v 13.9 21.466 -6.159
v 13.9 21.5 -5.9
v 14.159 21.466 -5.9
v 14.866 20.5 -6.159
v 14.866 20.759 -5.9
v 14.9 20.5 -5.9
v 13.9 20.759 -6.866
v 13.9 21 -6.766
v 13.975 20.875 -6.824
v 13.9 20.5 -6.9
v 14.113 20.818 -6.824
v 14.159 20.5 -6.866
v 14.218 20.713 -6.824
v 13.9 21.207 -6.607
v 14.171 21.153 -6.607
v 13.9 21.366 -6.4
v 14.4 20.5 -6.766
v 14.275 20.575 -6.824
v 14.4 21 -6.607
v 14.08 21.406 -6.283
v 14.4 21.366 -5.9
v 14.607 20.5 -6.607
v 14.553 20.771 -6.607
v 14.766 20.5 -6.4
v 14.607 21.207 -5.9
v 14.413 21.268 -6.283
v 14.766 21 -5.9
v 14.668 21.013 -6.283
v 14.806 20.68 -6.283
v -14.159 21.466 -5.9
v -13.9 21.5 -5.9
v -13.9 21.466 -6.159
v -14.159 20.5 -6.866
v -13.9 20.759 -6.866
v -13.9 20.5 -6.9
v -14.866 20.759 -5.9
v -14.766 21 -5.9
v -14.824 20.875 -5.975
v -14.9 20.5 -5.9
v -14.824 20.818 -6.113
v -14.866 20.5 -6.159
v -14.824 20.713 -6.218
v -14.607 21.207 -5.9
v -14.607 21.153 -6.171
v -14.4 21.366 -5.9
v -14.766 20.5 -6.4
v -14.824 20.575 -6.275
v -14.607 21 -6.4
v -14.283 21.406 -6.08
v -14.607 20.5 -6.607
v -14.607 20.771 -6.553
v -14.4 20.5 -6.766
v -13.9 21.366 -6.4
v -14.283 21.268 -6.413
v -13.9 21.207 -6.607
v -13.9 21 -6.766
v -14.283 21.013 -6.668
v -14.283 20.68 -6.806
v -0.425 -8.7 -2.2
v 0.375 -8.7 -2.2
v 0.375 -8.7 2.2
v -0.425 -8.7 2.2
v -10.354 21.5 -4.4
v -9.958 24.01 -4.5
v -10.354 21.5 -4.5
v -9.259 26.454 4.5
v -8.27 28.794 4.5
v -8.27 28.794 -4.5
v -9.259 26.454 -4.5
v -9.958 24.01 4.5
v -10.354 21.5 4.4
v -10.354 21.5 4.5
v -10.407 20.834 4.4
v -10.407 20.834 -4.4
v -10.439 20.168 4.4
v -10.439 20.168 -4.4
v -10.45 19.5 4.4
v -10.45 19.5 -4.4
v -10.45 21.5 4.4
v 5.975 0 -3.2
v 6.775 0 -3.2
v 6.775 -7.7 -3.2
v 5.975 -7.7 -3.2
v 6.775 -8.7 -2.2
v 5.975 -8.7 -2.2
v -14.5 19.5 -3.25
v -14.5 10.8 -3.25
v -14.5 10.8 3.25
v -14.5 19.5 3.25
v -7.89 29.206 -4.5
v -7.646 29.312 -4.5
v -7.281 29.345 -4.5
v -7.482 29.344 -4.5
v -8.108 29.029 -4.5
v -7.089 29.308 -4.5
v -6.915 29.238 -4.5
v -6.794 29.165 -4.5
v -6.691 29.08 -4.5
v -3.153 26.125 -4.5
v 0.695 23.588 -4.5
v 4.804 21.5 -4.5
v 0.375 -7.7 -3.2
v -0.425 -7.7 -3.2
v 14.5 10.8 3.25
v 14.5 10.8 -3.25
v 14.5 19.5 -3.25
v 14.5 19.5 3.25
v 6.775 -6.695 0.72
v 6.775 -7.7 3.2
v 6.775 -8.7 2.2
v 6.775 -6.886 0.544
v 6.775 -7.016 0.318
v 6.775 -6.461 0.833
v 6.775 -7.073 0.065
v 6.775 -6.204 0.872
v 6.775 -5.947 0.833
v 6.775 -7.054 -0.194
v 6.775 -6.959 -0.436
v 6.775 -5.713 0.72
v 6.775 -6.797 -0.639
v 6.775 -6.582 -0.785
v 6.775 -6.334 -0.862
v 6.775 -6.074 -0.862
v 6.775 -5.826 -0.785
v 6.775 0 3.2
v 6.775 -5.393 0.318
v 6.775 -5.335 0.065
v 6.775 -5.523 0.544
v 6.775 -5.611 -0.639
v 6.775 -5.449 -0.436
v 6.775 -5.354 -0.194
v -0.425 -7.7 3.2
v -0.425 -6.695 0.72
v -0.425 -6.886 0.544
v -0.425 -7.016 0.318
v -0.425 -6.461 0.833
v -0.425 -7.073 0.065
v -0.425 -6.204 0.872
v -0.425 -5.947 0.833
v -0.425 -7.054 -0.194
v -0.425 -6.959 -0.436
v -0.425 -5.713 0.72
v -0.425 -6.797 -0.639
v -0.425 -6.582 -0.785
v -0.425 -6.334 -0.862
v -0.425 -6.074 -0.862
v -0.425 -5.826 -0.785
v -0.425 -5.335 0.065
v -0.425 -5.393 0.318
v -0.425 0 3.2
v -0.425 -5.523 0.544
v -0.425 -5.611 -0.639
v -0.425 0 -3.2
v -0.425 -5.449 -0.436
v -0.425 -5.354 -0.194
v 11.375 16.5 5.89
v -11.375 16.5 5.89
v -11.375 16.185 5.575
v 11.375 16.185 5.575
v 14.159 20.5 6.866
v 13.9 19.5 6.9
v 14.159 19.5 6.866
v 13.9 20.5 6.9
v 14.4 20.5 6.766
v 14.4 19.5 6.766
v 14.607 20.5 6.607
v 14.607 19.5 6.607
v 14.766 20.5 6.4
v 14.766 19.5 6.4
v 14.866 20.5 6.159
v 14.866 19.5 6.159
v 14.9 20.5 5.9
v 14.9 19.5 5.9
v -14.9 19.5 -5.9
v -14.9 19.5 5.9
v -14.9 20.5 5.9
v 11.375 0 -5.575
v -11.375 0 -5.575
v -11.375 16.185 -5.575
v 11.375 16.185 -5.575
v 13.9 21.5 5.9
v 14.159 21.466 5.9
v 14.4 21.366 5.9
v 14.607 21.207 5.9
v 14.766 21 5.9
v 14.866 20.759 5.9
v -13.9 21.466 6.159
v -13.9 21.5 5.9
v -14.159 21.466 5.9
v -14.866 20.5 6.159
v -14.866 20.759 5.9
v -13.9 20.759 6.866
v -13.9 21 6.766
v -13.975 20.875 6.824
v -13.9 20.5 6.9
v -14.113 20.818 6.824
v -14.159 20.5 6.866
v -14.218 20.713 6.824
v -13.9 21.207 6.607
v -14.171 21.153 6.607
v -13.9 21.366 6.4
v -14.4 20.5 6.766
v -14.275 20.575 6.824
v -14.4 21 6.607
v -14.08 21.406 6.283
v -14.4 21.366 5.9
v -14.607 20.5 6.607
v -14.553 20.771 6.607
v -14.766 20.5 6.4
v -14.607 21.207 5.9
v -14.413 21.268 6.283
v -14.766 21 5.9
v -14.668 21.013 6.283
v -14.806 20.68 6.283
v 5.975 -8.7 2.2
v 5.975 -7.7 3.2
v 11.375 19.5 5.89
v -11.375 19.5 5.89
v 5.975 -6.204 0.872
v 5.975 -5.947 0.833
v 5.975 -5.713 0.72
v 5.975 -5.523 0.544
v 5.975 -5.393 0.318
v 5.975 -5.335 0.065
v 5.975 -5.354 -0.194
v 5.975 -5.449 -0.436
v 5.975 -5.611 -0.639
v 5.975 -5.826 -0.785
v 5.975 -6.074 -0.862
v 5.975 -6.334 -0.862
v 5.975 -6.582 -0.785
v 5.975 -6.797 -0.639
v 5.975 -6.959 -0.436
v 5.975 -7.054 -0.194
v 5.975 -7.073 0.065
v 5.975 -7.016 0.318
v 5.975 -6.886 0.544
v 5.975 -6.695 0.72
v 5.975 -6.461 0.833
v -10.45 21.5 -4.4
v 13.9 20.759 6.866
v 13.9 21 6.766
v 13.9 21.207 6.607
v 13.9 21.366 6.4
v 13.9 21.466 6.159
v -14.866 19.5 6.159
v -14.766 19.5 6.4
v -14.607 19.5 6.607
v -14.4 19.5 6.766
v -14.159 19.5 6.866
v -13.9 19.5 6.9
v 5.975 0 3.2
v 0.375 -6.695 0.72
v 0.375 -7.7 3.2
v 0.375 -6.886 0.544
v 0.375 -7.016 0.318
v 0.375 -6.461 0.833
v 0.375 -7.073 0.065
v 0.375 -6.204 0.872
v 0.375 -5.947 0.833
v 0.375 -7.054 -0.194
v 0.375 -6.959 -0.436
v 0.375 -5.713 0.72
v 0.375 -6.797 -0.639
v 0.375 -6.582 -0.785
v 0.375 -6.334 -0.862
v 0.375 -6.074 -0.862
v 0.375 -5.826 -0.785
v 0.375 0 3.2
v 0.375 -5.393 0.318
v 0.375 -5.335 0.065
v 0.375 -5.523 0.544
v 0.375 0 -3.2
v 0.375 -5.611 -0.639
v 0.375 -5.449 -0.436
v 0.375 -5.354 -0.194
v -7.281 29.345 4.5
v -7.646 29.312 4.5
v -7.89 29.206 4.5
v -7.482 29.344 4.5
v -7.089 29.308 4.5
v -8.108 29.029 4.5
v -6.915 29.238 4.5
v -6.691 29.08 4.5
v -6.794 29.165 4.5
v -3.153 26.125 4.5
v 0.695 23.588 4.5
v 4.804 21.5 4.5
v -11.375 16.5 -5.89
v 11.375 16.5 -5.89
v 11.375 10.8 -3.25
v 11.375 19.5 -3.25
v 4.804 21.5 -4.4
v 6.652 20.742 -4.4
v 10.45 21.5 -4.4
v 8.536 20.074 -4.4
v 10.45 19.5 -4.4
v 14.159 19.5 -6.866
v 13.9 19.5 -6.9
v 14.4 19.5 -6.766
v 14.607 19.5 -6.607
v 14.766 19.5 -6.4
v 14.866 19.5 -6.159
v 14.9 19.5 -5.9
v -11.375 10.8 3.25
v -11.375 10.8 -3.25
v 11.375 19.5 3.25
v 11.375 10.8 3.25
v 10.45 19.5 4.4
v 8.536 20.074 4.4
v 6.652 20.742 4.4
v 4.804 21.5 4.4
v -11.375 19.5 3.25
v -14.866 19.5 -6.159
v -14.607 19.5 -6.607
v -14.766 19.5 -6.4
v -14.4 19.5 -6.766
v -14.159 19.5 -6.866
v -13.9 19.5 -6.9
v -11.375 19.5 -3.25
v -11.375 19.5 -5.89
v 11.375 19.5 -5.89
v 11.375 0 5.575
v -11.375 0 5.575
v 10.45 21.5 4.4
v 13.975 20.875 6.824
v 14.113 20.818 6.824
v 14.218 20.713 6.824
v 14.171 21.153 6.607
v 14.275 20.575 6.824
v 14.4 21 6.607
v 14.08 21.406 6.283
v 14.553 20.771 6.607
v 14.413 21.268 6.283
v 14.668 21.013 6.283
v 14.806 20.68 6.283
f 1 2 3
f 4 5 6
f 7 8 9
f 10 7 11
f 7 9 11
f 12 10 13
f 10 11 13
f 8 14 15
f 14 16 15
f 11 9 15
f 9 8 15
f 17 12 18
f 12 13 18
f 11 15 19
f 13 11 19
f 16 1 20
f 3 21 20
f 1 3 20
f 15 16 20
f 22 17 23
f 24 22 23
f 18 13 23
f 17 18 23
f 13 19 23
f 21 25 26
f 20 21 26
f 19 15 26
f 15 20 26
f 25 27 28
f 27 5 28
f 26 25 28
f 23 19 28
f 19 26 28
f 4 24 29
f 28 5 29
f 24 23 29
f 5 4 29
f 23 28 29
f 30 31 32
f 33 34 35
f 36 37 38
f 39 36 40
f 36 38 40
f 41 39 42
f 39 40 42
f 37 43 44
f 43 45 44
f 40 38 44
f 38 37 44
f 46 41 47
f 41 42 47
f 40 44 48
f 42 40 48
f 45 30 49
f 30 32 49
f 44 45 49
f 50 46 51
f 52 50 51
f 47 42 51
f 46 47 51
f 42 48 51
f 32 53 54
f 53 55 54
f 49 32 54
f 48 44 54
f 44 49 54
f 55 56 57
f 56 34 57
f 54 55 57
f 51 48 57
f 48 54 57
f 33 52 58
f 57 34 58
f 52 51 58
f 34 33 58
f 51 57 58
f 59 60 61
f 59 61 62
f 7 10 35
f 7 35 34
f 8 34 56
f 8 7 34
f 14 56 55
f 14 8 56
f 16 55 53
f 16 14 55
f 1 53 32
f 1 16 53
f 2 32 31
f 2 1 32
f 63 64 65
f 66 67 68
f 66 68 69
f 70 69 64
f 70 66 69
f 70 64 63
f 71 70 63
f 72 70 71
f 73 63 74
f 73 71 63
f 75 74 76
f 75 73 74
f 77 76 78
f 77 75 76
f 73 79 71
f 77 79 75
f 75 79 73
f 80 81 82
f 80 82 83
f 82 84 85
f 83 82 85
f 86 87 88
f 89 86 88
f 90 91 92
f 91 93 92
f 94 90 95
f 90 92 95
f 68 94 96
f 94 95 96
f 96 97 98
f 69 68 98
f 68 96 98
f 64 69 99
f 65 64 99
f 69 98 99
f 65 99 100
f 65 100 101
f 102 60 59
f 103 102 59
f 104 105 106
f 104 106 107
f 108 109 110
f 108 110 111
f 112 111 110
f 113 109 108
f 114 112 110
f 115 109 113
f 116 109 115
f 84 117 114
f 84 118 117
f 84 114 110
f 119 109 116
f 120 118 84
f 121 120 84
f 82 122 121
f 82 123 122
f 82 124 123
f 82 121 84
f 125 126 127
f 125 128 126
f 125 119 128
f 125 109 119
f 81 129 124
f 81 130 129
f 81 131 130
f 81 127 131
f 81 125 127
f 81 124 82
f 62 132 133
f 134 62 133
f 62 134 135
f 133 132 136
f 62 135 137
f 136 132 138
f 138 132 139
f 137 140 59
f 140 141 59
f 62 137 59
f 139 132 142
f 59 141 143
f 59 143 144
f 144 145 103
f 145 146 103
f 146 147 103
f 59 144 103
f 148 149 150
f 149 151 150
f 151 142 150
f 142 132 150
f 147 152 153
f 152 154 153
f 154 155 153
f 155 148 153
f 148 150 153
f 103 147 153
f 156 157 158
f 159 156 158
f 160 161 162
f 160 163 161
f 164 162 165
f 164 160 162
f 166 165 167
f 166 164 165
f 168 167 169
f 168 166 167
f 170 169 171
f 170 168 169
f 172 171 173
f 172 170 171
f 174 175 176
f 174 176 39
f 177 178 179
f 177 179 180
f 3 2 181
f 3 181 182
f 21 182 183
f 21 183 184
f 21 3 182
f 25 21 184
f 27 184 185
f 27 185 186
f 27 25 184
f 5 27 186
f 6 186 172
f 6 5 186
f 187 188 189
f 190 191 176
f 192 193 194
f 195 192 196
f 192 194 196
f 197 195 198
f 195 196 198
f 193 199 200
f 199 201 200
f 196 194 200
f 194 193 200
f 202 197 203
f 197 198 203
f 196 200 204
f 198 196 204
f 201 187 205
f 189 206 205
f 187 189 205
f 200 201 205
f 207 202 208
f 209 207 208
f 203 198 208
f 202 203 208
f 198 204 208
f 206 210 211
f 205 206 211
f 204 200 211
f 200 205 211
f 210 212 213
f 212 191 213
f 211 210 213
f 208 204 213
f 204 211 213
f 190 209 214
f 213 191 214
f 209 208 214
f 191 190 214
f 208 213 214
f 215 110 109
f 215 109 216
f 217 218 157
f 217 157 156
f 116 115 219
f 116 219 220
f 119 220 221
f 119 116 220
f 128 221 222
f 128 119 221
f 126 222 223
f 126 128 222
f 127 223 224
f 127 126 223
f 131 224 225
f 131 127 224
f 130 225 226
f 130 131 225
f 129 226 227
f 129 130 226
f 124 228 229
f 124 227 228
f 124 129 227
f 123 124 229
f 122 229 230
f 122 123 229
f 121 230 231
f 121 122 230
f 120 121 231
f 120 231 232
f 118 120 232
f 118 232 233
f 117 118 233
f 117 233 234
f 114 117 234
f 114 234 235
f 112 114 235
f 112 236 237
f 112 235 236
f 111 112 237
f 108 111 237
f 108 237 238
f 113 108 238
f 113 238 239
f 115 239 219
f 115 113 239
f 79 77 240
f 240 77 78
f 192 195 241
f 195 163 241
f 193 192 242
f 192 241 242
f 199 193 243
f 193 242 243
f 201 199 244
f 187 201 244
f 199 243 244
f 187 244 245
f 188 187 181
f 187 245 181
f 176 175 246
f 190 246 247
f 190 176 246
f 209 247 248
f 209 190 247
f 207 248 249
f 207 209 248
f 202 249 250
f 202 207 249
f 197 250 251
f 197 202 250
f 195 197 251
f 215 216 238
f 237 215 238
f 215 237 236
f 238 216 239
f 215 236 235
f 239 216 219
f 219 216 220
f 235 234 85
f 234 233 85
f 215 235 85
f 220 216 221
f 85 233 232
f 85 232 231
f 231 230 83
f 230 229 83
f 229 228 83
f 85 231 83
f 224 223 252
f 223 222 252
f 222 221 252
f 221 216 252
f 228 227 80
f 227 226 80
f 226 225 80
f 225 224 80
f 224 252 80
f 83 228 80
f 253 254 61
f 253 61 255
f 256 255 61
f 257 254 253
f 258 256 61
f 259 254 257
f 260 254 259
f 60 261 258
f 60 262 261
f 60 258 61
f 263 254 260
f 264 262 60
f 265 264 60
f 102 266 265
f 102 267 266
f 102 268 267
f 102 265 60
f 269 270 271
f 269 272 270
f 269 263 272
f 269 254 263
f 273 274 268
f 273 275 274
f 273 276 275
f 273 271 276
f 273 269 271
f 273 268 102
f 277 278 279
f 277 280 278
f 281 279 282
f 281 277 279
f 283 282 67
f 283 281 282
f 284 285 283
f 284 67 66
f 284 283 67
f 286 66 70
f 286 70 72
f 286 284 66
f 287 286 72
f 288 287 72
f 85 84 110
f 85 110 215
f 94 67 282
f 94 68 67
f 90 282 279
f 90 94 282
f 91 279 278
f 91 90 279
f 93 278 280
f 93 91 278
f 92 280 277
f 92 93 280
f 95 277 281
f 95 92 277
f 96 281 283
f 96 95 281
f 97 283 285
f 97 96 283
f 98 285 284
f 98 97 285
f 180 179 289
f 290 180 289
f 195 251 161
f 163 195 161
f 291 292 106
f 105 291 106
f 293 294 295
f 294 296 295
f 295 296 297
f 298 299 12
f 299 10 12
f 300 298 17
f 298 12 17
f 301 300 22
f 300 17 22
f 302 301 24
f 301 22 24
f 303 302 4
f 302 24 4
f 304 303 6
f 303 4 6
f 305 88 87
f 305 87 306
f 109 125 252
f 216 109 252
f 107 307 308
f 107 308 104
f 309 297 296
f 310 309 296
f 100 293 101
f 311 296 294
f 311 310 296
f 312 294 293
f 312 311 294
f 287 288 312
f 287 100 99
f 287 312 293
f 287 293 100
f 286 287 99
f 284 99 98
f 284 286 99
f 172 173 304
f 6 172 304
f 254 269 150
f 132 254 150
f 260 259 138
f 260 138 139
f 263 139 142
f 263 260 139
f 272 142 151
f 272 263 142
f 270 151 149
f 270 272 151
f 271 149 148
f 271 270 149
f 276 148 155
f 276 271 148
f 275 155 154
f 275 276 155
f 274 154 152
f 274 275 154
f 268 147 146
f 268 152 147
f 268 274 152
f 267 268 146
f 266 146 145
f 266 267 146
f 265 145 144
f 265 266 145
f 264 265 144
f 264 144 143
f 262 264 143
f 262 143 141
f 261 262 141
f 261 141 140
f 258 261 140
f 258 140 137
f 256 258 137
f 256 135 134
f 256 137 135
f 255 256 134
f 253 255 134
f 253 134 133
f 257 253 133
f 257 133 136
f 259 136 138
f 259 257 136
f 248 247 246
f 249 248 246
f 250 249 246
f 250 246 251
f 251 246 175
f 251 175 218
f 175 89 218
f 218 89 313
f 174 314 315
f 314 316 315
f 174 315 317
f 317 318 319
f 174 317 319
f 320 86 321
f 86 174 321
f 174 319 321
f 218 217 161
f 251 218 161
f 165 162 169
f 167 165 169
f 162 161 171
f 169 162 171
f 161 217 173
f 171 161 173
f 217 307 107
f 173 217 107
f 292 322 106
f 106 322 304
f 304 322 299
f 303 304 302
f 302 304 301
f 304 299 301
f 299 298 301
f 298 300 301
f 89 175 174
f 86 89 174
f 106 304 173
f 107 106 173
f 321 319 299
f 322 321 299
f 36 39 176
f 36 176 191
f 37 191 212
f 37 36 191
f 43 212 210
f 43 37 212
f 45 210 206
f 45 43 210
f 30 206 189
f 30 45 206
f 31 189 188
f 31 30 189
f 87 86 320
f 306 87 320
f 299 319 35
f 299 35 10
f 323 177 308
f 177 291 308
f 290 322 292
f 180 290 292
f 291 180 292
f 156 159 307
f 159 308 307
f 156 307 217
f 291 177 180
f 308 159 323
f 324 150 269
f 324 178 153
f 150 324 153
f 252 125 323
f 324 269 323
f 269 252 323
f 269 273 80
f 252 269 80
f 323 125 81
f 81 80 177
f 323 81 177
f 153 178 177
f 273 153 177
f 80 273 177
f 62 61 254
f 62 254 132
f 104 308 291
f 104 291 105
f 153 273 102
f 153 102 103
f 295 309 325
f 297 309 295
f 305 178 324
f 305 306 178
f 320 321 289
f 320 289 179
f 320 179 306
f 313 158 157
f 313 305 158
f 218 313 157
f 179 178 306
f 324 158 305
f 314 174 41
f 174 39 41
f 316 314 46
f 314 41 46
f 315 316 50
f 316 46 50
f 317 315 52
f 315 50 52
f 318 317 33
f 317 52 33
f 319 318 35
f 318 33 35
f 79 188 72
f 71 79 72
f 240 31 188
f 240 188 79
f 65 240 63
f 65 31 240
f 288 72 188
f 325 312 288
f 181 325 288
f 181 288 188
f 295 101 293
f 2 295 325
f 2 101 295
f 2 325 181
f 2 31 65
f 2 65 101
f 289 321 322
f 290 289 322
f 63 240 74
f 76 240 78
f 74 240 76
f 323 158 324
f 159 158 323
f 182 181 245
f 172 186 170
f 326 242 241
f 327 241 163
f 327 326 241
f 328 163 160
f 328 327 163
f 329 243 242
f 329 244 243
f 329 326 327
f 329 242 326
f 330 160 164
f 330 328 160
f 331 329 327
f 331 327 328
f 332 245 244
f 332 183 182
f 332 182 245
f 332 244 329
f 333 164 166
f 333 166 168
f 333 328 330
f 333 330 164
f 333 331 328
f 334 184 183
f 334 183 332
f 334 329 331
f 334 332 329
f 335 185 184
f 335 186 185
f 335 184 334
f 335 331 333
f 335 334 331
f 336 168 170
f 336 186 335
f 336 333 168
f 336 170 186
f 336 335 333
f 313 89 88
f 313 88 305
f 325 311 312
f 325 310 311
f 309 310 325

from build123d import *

# Parameters (mm, degrees)
SKETCH1_W               = 22.75
SKETCH1_H               = 11.15
BOSS_EXTRUDE1_DEPTH     = 19.5
SKETCH2_W               = 29.8
SKETCH2_H               = 13.8
SKETCH2_W_2             = 20.9
SKETCH2_H_2             = 8.8
BOSS_EXTRUDE2_DEPTH     = 2
FILLET1_R               = 1
BOSS_EXTRUDE3_DEPTH     = 4.5
FILLET2_R               = 1
SKETCH4_W               = 0.8
SKETCH4_H               = 6.4
BOSS_EXTRUDE4_DEPTH     = 8.7
CHAMFER1_SIZE           = 1
SKETCH5_W               = 29
SKETCH5_H               = 6.5
BOSS_EXTRUDE5_DEPTH     = 8.7
SKETCH6_W               = 22.75
SKETCH6_H               = 11.78
BOSS_EXTRUDE6_DEPTH     = 3.5
CHAMFER2_SIZE           = 0.5
CUT_EXTRUDE1_DEPTH      = 34.821116013
CUT_EXTRUDE1_DEPTH_BACK = 34.821116013
SKETCH7_R               = 0.871711707


with BuildPart() as part:
    # Sketch1 → Boss-Extrude1 (new body)
    with BuildSketch(Plane(origin=(0, 0, 0), x_dir=(1, 0, 0), z_dir=(0, 1, 0))):
        Rectangle(SKETCH1_W, SKETCH1_H)
    extrude(amount=BOSS_EXTRUDE1_DEPTH)

    # Sketch2 → Boss-Extrude2 (add)
    with BuildSketch(Plane(origin=(0, 19.5, 0), x_dir=(1, 0, 0), z_dir=(0, 1, 0))):
        Rectangle(SKETCH2_W, SKETCH2_H)
        Rectangle(SKETCH2_W_2, SKETCH2_H_2, mode=Mode.SUBTRACT)
    extrude(amount=BOSS_EXTRUDE2_DEPTH)

    # Fillet1
    fillet1_edges = [part.edges().sort_by_distance(p)[0] for p in [
        (14.9, 21.5, 0),
        (0, 21.5, -6.9),
        (-14.9, 21.5, 0),
        (0, 21.5, 6.9),
        (14.9, 20.5, 6.9),
        (14.9, 20.5, -6.9),
        (-14.9, 20.5, -6.9),
        (-14.9, 20.5, 6.9),
    ]]
    fillet(fillet1_edges, radius=FILLET1_R)

    # Sketch3 → Boss-Extrude3 (add, symmetric)
    with BuildSketch(Plane.XY):
        with BuildLine():
            ThreePointArc((-7.628944694, 29.986265243), (-9.732417399, 24.929551358), (-10.45, 19.5))
            Line((-10.45, 19.5), (10.45, 19.5))
            ThreePointArc((10.45, 19.5), (0.729024757, 23.568181114), (-7.628944694, 29.986265243))
        make_face()
    extrude(amount=BOSS_EXTRUDE3_DEPTH, both=True)

    # Fillet2
    fillet2_edges = [part.edges().sort_by_distance(p)[0] for p in [
        (-7.628944694, 29.986265243, 0),
    ]]
    fillet(fillet2_edges, radius=FILLET2_R)

    # Sketch4 → Boss-Extrude4 (add)
    with BuildSketch(Plane(origin=(0, 0, 0), x_dir=(-1, 0, 0), z_dir=(0, -1, 0))):
        with Locations((-6.375, 0)):
            Rectangle(SKETCH4_W, SKETCH4_H)
        with Locations((0.025, 0)):
            Rectangle(SKETCH4_W, SKETCH4_H)
    extrude(amount=BOSS_EXTRUDE4_DEPTH)

    # Chamfer1
    chamfer1_edges = [part.edges().sort_by_distance(p)[0] for p in [
        (6.375, -8.7, 3.2),
        (6.375, -8.7, -3.2),
        (-0.025, -8.7, 3.2),
        (-0.025, -8.7, -3.2),
    ]]
    chamfer(chamfer1_edges, length=CHAMFER1_SIZE)

    # Sketch5 → Boss-Extrude5 (add)
    with BuildSketch(Plane.XZ.offset(-19.5)):
        Rectangle(SKETCH5_W, SKETCH5_H)
    extrude(amount=BOSS_EXTRUDE5_DEPTH)

    # Sketch6 → Boss-Extrude6 (add)
    with BuildSketch(Plane.XZ.offset(-19.5)):
        Rectangle(SKETCH6_W, SKETCH6_H)
    extrude(amount=BOSS_EXTRUDE6_DEPTH)

    # Chamfer2
    # the kernel refuses this chamfer: 0.5 mm, written as the material it takes off along each edge
    with BuildSketch(Plane(origin=(-12.660841494, 16, -5.89), x_dir=(0, -0.027495876610585647, 0.9996219169112968), z_dir=(1, 0, 0))) as chamfer2_piece_1_section:
        Polygon((CHAMFER2_SIZE * 0.999621916911, -CHAMFER2_SIZE * 0.0274958766106), (-CHAMFER2_SIZE * 0.0274958766106, -CHAMFER2_SIZE * 0.999621916911), (0, 0), align=None)
    chamfer2_piece_1 = extrude(amount=25.321682988, mode=Mode.PRIVATE)
    chamfer2_piece_1 = split(chamfer2_piece_1, bisect_by=Plane(origin=(0, 16.184966798, -5.575), z_dir=(0, 0, -1)), keep=Keep.TOP, mode=Mode.PRIVATE)
    add(chamfer2_piece_1, mode=Mode.SUBTRACT)
    with BuildSketch(Plane(origin=(12.660841494, 16, 5.89), x_dir=(0, 0.9996219169112968, 0.02749587661058555), z_dir=(-1, 0, 0))) as chamfer2_piece_2_section:
        Polygon((CHAMFER2_SIZE * 0.999621916911, CHAMFER2_SIZE * 0.0274958766106), (-CHAMFER2_SIZE * 0.0274958766106, CHAMFER2_SIZE * 0.999621916911), (0, 0), align=None)
    chamfer2_piece_2 = extrude(amount=25.321682988, mode=Mode.PRIVATE)
    chamfer2_piece_2 = split(chamfer2_piece_2, bisect_by=Plane(origin=(0, 16.184966798, 5.575), z_dir=(0, 0, 1)), keep=Keep.TOP, mode=Mode.PRIVATE)
    add(chamfer2_piece_2, mode=Mode.SUBTRACT)

    # Sketch7 → Cut-Extrude1 (cut, two sides: drawn at the far end of the back side and taken through both)
    with BuildSketch(Plane.ZY.offset(0.425).offset(-CUT_EXTRUDE1_DEPTH_BACK)):
        with Locations((0, -6.204058817)):
            Circle(SKETCH7_R)
    extrude(amount=CUT_EXTRUDE1_DEPTH + CUT_EXTRUDE1_DEPTH_BACK, mode=Mode.SUBTRACT)


solid = part.part
